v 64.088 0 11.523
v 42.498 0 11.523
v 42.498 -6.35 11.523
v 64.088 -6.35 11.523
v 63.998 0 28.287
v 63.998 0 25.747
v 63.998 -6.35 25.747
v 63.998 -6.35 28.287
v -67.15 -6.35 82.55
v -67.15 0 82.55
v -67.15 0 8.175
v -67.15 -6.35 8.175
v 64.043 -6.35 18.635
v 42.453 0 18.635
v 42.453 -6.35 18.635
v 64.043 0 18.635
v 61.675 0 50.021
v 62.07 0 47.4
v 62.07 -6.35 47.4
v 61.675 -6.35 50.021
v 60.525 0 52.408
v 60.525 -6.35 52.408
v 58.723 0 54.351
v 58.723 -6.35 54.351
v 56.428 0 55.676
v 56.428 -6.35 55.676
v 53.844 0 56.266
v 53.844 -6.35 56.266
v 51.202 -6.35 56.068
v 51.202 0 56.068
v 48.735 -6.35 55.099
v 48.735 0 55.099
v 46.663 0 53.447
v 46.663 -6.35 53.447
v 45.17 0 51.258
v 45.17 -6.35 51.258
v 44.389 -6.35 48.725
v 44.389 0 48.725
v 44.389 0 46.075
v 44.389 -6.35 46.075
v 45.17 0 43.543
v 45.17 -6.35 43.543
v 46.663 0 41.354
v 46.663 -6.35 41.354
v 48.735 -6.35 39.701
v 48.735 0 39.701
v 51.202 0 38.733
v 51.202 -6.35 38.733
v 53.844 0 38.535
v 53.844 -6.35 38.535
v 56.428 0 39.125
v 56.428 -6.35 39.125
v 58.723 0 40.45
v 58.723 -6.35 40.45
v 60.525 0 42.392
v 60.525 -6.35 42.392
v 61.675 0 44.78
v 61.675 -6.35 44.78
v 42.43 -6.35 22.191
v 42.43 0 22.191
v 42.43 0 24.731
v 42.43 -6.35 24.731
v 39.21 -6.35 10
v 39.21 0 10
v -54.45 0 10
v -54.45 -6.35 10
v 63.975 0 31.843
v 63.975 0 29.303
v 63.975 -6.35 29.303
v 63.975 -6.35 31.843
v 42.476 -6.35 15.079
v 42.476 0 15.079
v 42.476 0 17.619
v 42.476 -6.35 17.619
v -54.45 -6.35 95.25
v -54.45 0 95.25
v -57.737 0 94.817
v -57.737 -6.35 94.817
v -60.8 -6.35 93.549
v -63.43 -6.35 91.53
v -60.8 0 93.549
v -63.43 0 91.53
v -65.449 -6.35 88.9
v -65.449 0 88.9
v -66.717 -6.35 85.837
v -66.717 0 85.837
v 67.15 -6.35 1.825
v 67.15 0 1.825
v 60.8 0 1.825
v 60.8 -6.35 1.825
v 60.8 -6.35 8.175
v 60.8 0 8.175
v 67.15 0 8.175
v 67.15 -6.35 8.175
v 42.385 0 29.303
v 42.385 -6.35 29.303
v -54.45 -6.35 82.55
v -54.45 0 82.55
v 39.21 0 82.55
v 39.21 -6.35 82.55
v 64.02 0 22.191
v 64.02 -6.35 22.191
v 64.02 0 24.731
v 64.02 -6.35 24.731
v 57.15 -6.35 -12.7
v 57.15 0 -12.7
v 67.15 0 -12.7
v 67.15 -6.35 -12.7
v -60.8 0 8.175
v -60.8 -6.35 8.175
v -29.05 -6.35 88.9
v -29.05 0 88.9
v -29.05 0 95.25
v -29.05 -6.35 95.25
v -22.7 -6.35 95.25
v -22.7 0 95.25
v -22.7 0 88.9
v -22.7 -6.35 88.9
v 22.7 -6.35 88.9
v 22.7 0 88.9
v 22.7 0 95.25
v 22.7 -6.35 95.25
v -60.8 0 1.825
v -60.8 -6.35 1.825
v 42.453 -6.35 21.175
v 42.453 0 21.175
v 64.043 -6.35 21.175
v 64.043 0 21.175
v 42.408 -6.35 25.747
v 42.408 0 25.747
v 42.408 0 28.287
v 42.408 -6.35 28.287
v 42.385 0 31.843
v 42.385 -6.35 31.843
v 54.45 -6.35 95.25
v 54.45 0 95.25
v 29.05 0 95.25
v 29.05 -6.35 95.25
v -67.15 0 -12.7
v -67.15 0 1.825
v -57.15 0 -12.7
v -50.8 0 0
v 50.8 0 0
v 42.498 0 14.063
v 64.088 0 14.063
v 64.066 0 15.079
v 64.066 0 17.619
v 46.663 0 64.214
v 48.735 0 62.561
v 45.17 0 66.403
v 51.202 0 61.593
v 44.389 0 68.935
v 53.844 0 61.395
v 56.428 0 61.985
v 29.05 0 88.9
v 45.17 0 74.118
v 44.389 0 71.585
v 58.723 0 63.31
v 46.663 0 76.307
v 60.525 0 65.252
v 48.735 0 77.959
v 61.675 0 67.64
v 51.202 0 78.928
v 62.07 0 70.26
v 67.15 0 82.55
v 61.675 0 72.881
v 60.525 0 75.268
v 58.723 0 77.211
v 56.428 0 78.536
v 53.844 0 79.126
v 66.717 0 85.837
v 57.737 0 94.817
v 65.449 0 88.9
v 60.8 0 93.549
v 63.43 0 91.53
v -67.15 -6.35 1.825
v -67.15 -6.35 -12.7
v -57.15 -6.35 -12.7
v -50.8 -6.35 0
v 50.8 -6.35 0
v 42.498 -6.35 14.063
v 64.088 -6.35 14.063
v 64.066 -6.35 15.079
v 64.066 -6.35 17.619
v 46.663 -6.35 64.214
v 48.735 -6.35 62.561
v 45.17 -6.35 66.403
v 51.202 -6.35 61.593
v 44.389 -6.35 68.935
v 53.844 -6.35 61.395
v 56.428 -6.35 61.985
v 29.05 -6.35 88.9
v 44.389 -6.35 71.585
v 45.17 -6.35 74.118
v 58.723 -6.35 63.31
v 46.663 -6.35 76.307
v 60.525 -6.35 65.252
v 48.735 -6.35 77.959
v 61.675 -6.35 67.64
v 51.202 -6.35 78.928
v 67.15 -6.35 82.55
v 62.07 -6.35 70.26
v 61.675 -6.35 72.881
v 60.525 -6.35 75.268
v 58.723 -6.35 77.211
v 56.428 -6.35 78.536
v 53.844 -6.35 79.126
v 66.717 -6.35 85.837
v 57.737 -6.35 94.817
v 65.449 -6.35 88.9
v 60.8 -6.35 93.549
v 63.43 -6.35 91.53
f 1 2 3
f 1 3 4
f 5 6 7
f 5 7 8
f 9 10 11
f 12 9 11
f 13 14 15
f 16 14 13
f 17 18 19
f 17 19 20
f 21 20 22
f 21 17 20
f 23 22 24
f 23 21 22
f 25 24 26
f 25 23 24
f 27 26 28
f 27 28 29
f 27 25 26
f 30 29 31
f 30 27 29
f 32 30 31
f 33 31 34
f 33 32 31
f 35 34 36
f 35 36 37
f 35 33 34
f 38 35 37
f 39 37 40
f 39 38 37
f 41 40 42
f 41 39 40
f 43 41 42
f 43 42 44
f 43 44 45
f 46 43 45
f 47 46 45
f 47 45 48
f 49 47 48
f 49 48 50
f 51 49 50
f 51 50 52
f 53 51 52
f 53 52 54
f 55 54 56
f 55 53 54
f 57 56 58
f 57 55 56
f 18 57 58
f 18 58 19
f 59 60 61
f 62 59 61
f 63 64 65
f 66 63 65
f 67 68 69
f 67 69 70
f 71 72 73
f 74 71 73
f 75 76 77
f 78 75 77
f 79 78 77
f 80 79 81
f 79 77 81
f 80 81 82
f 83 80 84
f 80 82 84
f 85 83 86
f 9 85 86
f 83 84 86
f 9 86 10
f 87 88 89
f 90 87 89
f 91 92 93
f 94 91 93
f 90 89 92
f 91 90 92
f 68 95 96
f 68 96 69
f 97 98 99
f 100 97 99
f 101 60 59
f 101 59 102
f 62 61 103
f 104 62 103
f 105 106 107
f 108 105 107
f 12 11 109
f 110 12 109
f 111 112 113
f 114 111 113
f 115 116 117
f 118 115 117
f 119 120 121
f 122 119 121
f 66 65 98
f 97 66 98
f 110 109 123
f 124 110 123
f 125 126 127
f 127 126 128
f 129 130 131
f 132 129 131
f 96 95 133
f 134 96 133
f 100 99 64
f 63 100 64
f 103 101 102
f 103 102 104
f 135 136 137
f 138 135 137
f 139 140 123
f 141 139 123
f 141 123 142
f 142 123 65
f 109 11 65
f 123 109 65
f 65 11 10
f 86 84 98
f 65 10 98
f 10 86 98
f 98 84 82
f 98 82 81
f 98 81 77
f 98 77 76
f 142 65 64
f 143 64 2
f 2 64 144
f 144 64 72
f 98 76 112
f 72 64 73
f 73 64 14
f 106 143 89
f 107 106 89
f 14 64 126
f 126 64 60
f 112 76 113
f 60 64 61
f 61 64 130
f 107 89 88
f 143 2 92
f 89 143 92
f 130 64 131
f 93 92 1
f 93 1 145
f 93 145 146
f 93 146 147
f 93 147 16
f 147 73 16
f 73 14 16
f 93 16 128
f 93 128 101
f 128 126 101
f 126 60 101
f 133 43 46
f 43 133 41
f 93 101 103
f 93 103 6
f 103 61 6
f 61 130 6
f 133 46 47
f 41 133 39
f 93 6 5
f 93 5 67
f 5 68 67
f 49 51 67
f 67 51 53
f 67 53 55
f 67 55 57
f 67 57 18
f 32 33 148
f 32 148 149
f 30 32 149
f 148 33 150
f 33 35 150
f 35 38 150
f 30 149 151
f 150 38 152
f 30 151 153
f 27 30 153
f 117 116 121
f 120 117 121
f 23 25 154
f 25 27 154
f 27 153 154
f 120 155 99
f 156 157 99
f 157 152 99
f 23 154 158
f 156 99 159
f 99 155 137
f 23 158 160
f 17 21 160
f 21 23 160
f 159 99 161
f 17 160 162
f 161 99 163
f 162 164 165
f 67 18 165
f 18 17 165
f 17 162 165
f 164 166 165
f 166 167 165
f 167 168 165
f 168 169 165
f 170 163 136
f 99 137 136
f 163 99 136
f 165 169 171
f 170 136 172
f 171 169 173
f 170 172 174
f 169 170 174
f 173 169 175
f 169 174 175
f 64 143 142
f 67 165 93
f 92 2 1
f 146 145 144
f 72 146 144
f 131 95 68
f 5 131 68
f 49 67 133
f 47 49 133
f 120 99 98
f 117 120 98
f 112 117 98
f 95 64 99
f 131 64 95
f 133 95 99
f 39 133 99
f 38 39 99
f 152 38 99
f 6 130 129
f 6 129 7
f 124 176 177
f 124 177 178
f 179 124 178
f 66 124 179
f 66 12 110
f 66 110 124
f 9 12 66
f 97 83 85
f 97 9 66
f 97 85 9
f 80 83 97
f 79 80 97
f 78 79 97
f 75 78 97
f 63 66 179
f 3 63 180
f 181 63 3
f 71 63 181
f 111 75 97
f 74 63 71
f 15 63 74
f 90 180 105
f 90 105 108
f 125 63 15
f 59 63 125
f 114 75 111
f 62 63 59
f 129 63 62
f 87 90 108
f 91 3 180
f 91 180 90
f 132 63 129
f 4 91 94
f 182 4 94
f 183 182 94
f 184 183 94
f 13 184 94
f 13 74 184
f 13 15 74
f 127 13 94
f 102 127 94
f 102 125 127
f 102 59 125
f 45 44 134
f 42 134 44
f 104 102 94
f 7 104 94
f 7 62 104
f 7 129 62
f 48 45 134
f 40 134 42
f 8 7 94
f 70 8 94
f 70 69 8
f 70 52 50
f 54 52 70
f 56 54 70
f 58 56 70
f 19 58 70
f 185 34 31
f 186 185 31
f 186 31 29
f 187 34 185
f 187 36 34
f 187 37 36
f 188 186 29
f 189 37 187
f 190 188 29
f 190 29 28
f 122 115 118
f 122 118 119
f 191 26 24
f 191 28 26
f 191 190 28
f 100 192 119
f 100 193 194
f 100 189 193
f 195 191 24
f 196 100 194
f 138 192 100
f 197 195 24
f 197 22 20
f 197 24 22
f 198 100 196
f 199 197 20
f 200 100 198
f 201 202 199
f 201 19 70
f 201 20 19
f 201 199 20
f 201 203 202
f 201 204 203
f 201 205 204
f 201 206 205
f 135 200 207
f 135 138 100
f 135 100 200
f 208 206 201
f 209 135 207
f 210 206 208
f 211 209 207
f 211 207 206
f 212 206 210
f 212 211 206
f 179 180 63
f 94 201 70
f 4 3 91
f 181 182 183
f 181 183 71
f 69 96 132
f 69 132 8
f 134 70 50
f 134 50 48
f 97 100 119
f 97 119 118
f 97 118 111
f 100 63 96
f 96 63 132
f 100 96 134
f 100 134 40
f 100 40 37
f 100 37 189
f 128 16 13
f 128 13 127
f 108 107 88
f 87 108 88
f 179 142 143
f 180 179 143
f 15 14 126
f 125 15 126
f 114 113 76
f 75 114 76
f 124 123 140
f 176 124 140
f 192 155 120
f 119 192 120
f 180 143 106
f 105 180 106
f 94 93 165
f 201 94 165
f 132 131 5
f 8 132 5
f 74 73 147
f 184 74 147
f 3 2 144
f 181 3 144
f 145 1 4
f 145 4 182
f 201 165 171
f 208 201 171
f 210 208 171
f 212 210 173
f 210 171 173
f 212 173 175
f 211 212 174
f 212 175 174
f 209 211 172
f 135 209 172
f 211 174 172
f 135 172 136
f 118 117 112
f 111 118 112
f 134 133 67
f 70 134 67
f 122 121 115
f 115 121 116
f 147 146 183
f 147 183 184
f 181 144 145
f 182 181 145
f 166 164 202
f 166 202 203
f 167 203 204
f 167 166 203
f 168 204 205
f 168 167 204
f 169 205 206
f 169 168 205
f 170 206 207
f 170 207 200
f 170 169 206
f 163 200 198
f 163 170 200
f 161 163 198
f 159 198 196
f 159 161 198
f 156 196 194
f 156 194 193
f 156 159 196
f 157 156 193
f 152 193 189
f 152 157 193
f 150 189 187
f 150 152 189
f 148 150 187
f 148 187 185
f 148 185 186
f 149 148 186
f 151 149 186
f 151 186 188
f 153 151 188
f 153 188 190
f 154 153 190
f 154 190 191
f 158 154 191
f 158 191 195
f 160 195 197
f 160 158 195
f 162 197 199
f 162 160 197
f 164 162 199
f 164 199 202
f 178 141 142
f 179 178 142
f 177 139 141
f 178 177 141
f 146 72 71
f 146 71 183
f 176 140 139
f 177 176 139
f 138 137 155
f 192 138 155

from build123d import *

# Parameters (mm, degrees)
F1_W     = 21.59
F1_H     = 2.54
F1_R     = 8.89
F2_DEPTH = 6.35


# Not quite as in the source:
# - a variable given as a bare number and used for a length is read in inches; the dataset says mm whatever the document's units were


with BuildPart() as f2:
    # F1 (on Front) → F2 (new body)
    with BuildSketch(Plane.XZ):
        with BuildLine():
            Line((-50.8, 0), (0, 0))
            Line((0, 0), (50.8, 0))
            Line((50.8, 0), (57.15, -12.7))
            Line((57.15, -12.7), (67.15, -12.7))
            Line((67.15, -12.7), (67.15, 1.825))
            Line((67.15, 1.825), (60.8, 1.825))
            Line((60.8, 1.825), (60.8, 8.175))
            Line((60.8, 8.175), (67.15, 8.175))
            Line((67.15, 8.175), (67.15, 82.55))
            ThreePointArc((67.15, 82.55), (63.4302561211, 91.5302561211), (54.45, 95.25))
            Line((54.45, 95.25), (48.1170043349, 95.25))
            Line((48.1170043349, 95.25), (29.05, 95.25))
            Line((29.05, 95.25), (29.05, 88.9))
            Line((29.05, 88.9), (22.7, 88.9))
            Line((22.7, 88.9), (22.7, 95.25))
            Line((22.7, 95.25), (0, 95.25))
            Line((0, 95.25), (-22.7, 95.25))
            Line((-22.7, 95.25), (-22.7, 88.9))
            Line((-22.7, 88.9), (-29.05, 88.9))
            Line((-29.05, 88.9), (-29.05, 95.25))
            Line((-29.05, 95.25), (-48.1170043349, 95.25))
            Line((-48.1170043349, 95.25), (-54.45, 95.25))
            ThreePointArc((-54.45, 95.25), (-63.4302561211, 91.5302561211), (-67.15, 82.55))
            Line((-67.15, 82.55), (-67.15, 70.6480368972))
            Line((-67.15, 70.6480368972), (-67.15, 8.175))
            Line((-67.15, 8.175), (-60.8, 8.175))
            Line((-60.8, 8.175), (-60.8, 1.825))
            Line((-60.8, 1.825), (-67.15, 1.825))
            Line((-67.15, 1.825), (-67.15, -12.7))
            Line((-67.15, -12.7), (-57.15, -12.7))
            Line((-57.15, -12.7), (-50.8, 0))
        make_face()
        with Locations((53.2934233144, 12.7932670589)):
            Rectangle(F1_W, F1_H, mode=Mode.SUBTRACT)
        with Locations((53.2707386515, 16.3491947024)):
            Rectangle(F1_W, F1_H, mode=Mode.SUBTRACT)
        with Locations((53.2480539886, 19.9051223459)):
            Rectangle(F1_W, F1_H, mode=Mode.SUBTRACT)
        with Locations((53.2253693257, 23.4610499895)):
            Rectangle(F1_W, F1_H, mode=Mode.SUBTRACT)
        with Locations((53.2026846629, 27.016977633)):
            Rectangle(F1_W, F1_H, mode=Mode.SUBTRACT)
        with Locations((53.18, 30.5729052765)):
            Rectangle(F1_W, F1_H, mode=Mode.SUBTRACT)
        Polygon((-54.45, 10), (-54.45, 82.55), (0, 82.55), (39.21, 82.55), (39.21, 10), (0, 10), align=None, mode=Mode.SUBTRACT)
        with Locations((53.18, 47.4004052765)):
            Circle(F1_R, mode=Mode.SUBTRACT)
        with Locations((53.18, 70.2604052765)):
            Circle(F1_R, mode=Mode.SUBTRACT)
    extrude(amount=F2_DEPTH)


solid = f2.part
